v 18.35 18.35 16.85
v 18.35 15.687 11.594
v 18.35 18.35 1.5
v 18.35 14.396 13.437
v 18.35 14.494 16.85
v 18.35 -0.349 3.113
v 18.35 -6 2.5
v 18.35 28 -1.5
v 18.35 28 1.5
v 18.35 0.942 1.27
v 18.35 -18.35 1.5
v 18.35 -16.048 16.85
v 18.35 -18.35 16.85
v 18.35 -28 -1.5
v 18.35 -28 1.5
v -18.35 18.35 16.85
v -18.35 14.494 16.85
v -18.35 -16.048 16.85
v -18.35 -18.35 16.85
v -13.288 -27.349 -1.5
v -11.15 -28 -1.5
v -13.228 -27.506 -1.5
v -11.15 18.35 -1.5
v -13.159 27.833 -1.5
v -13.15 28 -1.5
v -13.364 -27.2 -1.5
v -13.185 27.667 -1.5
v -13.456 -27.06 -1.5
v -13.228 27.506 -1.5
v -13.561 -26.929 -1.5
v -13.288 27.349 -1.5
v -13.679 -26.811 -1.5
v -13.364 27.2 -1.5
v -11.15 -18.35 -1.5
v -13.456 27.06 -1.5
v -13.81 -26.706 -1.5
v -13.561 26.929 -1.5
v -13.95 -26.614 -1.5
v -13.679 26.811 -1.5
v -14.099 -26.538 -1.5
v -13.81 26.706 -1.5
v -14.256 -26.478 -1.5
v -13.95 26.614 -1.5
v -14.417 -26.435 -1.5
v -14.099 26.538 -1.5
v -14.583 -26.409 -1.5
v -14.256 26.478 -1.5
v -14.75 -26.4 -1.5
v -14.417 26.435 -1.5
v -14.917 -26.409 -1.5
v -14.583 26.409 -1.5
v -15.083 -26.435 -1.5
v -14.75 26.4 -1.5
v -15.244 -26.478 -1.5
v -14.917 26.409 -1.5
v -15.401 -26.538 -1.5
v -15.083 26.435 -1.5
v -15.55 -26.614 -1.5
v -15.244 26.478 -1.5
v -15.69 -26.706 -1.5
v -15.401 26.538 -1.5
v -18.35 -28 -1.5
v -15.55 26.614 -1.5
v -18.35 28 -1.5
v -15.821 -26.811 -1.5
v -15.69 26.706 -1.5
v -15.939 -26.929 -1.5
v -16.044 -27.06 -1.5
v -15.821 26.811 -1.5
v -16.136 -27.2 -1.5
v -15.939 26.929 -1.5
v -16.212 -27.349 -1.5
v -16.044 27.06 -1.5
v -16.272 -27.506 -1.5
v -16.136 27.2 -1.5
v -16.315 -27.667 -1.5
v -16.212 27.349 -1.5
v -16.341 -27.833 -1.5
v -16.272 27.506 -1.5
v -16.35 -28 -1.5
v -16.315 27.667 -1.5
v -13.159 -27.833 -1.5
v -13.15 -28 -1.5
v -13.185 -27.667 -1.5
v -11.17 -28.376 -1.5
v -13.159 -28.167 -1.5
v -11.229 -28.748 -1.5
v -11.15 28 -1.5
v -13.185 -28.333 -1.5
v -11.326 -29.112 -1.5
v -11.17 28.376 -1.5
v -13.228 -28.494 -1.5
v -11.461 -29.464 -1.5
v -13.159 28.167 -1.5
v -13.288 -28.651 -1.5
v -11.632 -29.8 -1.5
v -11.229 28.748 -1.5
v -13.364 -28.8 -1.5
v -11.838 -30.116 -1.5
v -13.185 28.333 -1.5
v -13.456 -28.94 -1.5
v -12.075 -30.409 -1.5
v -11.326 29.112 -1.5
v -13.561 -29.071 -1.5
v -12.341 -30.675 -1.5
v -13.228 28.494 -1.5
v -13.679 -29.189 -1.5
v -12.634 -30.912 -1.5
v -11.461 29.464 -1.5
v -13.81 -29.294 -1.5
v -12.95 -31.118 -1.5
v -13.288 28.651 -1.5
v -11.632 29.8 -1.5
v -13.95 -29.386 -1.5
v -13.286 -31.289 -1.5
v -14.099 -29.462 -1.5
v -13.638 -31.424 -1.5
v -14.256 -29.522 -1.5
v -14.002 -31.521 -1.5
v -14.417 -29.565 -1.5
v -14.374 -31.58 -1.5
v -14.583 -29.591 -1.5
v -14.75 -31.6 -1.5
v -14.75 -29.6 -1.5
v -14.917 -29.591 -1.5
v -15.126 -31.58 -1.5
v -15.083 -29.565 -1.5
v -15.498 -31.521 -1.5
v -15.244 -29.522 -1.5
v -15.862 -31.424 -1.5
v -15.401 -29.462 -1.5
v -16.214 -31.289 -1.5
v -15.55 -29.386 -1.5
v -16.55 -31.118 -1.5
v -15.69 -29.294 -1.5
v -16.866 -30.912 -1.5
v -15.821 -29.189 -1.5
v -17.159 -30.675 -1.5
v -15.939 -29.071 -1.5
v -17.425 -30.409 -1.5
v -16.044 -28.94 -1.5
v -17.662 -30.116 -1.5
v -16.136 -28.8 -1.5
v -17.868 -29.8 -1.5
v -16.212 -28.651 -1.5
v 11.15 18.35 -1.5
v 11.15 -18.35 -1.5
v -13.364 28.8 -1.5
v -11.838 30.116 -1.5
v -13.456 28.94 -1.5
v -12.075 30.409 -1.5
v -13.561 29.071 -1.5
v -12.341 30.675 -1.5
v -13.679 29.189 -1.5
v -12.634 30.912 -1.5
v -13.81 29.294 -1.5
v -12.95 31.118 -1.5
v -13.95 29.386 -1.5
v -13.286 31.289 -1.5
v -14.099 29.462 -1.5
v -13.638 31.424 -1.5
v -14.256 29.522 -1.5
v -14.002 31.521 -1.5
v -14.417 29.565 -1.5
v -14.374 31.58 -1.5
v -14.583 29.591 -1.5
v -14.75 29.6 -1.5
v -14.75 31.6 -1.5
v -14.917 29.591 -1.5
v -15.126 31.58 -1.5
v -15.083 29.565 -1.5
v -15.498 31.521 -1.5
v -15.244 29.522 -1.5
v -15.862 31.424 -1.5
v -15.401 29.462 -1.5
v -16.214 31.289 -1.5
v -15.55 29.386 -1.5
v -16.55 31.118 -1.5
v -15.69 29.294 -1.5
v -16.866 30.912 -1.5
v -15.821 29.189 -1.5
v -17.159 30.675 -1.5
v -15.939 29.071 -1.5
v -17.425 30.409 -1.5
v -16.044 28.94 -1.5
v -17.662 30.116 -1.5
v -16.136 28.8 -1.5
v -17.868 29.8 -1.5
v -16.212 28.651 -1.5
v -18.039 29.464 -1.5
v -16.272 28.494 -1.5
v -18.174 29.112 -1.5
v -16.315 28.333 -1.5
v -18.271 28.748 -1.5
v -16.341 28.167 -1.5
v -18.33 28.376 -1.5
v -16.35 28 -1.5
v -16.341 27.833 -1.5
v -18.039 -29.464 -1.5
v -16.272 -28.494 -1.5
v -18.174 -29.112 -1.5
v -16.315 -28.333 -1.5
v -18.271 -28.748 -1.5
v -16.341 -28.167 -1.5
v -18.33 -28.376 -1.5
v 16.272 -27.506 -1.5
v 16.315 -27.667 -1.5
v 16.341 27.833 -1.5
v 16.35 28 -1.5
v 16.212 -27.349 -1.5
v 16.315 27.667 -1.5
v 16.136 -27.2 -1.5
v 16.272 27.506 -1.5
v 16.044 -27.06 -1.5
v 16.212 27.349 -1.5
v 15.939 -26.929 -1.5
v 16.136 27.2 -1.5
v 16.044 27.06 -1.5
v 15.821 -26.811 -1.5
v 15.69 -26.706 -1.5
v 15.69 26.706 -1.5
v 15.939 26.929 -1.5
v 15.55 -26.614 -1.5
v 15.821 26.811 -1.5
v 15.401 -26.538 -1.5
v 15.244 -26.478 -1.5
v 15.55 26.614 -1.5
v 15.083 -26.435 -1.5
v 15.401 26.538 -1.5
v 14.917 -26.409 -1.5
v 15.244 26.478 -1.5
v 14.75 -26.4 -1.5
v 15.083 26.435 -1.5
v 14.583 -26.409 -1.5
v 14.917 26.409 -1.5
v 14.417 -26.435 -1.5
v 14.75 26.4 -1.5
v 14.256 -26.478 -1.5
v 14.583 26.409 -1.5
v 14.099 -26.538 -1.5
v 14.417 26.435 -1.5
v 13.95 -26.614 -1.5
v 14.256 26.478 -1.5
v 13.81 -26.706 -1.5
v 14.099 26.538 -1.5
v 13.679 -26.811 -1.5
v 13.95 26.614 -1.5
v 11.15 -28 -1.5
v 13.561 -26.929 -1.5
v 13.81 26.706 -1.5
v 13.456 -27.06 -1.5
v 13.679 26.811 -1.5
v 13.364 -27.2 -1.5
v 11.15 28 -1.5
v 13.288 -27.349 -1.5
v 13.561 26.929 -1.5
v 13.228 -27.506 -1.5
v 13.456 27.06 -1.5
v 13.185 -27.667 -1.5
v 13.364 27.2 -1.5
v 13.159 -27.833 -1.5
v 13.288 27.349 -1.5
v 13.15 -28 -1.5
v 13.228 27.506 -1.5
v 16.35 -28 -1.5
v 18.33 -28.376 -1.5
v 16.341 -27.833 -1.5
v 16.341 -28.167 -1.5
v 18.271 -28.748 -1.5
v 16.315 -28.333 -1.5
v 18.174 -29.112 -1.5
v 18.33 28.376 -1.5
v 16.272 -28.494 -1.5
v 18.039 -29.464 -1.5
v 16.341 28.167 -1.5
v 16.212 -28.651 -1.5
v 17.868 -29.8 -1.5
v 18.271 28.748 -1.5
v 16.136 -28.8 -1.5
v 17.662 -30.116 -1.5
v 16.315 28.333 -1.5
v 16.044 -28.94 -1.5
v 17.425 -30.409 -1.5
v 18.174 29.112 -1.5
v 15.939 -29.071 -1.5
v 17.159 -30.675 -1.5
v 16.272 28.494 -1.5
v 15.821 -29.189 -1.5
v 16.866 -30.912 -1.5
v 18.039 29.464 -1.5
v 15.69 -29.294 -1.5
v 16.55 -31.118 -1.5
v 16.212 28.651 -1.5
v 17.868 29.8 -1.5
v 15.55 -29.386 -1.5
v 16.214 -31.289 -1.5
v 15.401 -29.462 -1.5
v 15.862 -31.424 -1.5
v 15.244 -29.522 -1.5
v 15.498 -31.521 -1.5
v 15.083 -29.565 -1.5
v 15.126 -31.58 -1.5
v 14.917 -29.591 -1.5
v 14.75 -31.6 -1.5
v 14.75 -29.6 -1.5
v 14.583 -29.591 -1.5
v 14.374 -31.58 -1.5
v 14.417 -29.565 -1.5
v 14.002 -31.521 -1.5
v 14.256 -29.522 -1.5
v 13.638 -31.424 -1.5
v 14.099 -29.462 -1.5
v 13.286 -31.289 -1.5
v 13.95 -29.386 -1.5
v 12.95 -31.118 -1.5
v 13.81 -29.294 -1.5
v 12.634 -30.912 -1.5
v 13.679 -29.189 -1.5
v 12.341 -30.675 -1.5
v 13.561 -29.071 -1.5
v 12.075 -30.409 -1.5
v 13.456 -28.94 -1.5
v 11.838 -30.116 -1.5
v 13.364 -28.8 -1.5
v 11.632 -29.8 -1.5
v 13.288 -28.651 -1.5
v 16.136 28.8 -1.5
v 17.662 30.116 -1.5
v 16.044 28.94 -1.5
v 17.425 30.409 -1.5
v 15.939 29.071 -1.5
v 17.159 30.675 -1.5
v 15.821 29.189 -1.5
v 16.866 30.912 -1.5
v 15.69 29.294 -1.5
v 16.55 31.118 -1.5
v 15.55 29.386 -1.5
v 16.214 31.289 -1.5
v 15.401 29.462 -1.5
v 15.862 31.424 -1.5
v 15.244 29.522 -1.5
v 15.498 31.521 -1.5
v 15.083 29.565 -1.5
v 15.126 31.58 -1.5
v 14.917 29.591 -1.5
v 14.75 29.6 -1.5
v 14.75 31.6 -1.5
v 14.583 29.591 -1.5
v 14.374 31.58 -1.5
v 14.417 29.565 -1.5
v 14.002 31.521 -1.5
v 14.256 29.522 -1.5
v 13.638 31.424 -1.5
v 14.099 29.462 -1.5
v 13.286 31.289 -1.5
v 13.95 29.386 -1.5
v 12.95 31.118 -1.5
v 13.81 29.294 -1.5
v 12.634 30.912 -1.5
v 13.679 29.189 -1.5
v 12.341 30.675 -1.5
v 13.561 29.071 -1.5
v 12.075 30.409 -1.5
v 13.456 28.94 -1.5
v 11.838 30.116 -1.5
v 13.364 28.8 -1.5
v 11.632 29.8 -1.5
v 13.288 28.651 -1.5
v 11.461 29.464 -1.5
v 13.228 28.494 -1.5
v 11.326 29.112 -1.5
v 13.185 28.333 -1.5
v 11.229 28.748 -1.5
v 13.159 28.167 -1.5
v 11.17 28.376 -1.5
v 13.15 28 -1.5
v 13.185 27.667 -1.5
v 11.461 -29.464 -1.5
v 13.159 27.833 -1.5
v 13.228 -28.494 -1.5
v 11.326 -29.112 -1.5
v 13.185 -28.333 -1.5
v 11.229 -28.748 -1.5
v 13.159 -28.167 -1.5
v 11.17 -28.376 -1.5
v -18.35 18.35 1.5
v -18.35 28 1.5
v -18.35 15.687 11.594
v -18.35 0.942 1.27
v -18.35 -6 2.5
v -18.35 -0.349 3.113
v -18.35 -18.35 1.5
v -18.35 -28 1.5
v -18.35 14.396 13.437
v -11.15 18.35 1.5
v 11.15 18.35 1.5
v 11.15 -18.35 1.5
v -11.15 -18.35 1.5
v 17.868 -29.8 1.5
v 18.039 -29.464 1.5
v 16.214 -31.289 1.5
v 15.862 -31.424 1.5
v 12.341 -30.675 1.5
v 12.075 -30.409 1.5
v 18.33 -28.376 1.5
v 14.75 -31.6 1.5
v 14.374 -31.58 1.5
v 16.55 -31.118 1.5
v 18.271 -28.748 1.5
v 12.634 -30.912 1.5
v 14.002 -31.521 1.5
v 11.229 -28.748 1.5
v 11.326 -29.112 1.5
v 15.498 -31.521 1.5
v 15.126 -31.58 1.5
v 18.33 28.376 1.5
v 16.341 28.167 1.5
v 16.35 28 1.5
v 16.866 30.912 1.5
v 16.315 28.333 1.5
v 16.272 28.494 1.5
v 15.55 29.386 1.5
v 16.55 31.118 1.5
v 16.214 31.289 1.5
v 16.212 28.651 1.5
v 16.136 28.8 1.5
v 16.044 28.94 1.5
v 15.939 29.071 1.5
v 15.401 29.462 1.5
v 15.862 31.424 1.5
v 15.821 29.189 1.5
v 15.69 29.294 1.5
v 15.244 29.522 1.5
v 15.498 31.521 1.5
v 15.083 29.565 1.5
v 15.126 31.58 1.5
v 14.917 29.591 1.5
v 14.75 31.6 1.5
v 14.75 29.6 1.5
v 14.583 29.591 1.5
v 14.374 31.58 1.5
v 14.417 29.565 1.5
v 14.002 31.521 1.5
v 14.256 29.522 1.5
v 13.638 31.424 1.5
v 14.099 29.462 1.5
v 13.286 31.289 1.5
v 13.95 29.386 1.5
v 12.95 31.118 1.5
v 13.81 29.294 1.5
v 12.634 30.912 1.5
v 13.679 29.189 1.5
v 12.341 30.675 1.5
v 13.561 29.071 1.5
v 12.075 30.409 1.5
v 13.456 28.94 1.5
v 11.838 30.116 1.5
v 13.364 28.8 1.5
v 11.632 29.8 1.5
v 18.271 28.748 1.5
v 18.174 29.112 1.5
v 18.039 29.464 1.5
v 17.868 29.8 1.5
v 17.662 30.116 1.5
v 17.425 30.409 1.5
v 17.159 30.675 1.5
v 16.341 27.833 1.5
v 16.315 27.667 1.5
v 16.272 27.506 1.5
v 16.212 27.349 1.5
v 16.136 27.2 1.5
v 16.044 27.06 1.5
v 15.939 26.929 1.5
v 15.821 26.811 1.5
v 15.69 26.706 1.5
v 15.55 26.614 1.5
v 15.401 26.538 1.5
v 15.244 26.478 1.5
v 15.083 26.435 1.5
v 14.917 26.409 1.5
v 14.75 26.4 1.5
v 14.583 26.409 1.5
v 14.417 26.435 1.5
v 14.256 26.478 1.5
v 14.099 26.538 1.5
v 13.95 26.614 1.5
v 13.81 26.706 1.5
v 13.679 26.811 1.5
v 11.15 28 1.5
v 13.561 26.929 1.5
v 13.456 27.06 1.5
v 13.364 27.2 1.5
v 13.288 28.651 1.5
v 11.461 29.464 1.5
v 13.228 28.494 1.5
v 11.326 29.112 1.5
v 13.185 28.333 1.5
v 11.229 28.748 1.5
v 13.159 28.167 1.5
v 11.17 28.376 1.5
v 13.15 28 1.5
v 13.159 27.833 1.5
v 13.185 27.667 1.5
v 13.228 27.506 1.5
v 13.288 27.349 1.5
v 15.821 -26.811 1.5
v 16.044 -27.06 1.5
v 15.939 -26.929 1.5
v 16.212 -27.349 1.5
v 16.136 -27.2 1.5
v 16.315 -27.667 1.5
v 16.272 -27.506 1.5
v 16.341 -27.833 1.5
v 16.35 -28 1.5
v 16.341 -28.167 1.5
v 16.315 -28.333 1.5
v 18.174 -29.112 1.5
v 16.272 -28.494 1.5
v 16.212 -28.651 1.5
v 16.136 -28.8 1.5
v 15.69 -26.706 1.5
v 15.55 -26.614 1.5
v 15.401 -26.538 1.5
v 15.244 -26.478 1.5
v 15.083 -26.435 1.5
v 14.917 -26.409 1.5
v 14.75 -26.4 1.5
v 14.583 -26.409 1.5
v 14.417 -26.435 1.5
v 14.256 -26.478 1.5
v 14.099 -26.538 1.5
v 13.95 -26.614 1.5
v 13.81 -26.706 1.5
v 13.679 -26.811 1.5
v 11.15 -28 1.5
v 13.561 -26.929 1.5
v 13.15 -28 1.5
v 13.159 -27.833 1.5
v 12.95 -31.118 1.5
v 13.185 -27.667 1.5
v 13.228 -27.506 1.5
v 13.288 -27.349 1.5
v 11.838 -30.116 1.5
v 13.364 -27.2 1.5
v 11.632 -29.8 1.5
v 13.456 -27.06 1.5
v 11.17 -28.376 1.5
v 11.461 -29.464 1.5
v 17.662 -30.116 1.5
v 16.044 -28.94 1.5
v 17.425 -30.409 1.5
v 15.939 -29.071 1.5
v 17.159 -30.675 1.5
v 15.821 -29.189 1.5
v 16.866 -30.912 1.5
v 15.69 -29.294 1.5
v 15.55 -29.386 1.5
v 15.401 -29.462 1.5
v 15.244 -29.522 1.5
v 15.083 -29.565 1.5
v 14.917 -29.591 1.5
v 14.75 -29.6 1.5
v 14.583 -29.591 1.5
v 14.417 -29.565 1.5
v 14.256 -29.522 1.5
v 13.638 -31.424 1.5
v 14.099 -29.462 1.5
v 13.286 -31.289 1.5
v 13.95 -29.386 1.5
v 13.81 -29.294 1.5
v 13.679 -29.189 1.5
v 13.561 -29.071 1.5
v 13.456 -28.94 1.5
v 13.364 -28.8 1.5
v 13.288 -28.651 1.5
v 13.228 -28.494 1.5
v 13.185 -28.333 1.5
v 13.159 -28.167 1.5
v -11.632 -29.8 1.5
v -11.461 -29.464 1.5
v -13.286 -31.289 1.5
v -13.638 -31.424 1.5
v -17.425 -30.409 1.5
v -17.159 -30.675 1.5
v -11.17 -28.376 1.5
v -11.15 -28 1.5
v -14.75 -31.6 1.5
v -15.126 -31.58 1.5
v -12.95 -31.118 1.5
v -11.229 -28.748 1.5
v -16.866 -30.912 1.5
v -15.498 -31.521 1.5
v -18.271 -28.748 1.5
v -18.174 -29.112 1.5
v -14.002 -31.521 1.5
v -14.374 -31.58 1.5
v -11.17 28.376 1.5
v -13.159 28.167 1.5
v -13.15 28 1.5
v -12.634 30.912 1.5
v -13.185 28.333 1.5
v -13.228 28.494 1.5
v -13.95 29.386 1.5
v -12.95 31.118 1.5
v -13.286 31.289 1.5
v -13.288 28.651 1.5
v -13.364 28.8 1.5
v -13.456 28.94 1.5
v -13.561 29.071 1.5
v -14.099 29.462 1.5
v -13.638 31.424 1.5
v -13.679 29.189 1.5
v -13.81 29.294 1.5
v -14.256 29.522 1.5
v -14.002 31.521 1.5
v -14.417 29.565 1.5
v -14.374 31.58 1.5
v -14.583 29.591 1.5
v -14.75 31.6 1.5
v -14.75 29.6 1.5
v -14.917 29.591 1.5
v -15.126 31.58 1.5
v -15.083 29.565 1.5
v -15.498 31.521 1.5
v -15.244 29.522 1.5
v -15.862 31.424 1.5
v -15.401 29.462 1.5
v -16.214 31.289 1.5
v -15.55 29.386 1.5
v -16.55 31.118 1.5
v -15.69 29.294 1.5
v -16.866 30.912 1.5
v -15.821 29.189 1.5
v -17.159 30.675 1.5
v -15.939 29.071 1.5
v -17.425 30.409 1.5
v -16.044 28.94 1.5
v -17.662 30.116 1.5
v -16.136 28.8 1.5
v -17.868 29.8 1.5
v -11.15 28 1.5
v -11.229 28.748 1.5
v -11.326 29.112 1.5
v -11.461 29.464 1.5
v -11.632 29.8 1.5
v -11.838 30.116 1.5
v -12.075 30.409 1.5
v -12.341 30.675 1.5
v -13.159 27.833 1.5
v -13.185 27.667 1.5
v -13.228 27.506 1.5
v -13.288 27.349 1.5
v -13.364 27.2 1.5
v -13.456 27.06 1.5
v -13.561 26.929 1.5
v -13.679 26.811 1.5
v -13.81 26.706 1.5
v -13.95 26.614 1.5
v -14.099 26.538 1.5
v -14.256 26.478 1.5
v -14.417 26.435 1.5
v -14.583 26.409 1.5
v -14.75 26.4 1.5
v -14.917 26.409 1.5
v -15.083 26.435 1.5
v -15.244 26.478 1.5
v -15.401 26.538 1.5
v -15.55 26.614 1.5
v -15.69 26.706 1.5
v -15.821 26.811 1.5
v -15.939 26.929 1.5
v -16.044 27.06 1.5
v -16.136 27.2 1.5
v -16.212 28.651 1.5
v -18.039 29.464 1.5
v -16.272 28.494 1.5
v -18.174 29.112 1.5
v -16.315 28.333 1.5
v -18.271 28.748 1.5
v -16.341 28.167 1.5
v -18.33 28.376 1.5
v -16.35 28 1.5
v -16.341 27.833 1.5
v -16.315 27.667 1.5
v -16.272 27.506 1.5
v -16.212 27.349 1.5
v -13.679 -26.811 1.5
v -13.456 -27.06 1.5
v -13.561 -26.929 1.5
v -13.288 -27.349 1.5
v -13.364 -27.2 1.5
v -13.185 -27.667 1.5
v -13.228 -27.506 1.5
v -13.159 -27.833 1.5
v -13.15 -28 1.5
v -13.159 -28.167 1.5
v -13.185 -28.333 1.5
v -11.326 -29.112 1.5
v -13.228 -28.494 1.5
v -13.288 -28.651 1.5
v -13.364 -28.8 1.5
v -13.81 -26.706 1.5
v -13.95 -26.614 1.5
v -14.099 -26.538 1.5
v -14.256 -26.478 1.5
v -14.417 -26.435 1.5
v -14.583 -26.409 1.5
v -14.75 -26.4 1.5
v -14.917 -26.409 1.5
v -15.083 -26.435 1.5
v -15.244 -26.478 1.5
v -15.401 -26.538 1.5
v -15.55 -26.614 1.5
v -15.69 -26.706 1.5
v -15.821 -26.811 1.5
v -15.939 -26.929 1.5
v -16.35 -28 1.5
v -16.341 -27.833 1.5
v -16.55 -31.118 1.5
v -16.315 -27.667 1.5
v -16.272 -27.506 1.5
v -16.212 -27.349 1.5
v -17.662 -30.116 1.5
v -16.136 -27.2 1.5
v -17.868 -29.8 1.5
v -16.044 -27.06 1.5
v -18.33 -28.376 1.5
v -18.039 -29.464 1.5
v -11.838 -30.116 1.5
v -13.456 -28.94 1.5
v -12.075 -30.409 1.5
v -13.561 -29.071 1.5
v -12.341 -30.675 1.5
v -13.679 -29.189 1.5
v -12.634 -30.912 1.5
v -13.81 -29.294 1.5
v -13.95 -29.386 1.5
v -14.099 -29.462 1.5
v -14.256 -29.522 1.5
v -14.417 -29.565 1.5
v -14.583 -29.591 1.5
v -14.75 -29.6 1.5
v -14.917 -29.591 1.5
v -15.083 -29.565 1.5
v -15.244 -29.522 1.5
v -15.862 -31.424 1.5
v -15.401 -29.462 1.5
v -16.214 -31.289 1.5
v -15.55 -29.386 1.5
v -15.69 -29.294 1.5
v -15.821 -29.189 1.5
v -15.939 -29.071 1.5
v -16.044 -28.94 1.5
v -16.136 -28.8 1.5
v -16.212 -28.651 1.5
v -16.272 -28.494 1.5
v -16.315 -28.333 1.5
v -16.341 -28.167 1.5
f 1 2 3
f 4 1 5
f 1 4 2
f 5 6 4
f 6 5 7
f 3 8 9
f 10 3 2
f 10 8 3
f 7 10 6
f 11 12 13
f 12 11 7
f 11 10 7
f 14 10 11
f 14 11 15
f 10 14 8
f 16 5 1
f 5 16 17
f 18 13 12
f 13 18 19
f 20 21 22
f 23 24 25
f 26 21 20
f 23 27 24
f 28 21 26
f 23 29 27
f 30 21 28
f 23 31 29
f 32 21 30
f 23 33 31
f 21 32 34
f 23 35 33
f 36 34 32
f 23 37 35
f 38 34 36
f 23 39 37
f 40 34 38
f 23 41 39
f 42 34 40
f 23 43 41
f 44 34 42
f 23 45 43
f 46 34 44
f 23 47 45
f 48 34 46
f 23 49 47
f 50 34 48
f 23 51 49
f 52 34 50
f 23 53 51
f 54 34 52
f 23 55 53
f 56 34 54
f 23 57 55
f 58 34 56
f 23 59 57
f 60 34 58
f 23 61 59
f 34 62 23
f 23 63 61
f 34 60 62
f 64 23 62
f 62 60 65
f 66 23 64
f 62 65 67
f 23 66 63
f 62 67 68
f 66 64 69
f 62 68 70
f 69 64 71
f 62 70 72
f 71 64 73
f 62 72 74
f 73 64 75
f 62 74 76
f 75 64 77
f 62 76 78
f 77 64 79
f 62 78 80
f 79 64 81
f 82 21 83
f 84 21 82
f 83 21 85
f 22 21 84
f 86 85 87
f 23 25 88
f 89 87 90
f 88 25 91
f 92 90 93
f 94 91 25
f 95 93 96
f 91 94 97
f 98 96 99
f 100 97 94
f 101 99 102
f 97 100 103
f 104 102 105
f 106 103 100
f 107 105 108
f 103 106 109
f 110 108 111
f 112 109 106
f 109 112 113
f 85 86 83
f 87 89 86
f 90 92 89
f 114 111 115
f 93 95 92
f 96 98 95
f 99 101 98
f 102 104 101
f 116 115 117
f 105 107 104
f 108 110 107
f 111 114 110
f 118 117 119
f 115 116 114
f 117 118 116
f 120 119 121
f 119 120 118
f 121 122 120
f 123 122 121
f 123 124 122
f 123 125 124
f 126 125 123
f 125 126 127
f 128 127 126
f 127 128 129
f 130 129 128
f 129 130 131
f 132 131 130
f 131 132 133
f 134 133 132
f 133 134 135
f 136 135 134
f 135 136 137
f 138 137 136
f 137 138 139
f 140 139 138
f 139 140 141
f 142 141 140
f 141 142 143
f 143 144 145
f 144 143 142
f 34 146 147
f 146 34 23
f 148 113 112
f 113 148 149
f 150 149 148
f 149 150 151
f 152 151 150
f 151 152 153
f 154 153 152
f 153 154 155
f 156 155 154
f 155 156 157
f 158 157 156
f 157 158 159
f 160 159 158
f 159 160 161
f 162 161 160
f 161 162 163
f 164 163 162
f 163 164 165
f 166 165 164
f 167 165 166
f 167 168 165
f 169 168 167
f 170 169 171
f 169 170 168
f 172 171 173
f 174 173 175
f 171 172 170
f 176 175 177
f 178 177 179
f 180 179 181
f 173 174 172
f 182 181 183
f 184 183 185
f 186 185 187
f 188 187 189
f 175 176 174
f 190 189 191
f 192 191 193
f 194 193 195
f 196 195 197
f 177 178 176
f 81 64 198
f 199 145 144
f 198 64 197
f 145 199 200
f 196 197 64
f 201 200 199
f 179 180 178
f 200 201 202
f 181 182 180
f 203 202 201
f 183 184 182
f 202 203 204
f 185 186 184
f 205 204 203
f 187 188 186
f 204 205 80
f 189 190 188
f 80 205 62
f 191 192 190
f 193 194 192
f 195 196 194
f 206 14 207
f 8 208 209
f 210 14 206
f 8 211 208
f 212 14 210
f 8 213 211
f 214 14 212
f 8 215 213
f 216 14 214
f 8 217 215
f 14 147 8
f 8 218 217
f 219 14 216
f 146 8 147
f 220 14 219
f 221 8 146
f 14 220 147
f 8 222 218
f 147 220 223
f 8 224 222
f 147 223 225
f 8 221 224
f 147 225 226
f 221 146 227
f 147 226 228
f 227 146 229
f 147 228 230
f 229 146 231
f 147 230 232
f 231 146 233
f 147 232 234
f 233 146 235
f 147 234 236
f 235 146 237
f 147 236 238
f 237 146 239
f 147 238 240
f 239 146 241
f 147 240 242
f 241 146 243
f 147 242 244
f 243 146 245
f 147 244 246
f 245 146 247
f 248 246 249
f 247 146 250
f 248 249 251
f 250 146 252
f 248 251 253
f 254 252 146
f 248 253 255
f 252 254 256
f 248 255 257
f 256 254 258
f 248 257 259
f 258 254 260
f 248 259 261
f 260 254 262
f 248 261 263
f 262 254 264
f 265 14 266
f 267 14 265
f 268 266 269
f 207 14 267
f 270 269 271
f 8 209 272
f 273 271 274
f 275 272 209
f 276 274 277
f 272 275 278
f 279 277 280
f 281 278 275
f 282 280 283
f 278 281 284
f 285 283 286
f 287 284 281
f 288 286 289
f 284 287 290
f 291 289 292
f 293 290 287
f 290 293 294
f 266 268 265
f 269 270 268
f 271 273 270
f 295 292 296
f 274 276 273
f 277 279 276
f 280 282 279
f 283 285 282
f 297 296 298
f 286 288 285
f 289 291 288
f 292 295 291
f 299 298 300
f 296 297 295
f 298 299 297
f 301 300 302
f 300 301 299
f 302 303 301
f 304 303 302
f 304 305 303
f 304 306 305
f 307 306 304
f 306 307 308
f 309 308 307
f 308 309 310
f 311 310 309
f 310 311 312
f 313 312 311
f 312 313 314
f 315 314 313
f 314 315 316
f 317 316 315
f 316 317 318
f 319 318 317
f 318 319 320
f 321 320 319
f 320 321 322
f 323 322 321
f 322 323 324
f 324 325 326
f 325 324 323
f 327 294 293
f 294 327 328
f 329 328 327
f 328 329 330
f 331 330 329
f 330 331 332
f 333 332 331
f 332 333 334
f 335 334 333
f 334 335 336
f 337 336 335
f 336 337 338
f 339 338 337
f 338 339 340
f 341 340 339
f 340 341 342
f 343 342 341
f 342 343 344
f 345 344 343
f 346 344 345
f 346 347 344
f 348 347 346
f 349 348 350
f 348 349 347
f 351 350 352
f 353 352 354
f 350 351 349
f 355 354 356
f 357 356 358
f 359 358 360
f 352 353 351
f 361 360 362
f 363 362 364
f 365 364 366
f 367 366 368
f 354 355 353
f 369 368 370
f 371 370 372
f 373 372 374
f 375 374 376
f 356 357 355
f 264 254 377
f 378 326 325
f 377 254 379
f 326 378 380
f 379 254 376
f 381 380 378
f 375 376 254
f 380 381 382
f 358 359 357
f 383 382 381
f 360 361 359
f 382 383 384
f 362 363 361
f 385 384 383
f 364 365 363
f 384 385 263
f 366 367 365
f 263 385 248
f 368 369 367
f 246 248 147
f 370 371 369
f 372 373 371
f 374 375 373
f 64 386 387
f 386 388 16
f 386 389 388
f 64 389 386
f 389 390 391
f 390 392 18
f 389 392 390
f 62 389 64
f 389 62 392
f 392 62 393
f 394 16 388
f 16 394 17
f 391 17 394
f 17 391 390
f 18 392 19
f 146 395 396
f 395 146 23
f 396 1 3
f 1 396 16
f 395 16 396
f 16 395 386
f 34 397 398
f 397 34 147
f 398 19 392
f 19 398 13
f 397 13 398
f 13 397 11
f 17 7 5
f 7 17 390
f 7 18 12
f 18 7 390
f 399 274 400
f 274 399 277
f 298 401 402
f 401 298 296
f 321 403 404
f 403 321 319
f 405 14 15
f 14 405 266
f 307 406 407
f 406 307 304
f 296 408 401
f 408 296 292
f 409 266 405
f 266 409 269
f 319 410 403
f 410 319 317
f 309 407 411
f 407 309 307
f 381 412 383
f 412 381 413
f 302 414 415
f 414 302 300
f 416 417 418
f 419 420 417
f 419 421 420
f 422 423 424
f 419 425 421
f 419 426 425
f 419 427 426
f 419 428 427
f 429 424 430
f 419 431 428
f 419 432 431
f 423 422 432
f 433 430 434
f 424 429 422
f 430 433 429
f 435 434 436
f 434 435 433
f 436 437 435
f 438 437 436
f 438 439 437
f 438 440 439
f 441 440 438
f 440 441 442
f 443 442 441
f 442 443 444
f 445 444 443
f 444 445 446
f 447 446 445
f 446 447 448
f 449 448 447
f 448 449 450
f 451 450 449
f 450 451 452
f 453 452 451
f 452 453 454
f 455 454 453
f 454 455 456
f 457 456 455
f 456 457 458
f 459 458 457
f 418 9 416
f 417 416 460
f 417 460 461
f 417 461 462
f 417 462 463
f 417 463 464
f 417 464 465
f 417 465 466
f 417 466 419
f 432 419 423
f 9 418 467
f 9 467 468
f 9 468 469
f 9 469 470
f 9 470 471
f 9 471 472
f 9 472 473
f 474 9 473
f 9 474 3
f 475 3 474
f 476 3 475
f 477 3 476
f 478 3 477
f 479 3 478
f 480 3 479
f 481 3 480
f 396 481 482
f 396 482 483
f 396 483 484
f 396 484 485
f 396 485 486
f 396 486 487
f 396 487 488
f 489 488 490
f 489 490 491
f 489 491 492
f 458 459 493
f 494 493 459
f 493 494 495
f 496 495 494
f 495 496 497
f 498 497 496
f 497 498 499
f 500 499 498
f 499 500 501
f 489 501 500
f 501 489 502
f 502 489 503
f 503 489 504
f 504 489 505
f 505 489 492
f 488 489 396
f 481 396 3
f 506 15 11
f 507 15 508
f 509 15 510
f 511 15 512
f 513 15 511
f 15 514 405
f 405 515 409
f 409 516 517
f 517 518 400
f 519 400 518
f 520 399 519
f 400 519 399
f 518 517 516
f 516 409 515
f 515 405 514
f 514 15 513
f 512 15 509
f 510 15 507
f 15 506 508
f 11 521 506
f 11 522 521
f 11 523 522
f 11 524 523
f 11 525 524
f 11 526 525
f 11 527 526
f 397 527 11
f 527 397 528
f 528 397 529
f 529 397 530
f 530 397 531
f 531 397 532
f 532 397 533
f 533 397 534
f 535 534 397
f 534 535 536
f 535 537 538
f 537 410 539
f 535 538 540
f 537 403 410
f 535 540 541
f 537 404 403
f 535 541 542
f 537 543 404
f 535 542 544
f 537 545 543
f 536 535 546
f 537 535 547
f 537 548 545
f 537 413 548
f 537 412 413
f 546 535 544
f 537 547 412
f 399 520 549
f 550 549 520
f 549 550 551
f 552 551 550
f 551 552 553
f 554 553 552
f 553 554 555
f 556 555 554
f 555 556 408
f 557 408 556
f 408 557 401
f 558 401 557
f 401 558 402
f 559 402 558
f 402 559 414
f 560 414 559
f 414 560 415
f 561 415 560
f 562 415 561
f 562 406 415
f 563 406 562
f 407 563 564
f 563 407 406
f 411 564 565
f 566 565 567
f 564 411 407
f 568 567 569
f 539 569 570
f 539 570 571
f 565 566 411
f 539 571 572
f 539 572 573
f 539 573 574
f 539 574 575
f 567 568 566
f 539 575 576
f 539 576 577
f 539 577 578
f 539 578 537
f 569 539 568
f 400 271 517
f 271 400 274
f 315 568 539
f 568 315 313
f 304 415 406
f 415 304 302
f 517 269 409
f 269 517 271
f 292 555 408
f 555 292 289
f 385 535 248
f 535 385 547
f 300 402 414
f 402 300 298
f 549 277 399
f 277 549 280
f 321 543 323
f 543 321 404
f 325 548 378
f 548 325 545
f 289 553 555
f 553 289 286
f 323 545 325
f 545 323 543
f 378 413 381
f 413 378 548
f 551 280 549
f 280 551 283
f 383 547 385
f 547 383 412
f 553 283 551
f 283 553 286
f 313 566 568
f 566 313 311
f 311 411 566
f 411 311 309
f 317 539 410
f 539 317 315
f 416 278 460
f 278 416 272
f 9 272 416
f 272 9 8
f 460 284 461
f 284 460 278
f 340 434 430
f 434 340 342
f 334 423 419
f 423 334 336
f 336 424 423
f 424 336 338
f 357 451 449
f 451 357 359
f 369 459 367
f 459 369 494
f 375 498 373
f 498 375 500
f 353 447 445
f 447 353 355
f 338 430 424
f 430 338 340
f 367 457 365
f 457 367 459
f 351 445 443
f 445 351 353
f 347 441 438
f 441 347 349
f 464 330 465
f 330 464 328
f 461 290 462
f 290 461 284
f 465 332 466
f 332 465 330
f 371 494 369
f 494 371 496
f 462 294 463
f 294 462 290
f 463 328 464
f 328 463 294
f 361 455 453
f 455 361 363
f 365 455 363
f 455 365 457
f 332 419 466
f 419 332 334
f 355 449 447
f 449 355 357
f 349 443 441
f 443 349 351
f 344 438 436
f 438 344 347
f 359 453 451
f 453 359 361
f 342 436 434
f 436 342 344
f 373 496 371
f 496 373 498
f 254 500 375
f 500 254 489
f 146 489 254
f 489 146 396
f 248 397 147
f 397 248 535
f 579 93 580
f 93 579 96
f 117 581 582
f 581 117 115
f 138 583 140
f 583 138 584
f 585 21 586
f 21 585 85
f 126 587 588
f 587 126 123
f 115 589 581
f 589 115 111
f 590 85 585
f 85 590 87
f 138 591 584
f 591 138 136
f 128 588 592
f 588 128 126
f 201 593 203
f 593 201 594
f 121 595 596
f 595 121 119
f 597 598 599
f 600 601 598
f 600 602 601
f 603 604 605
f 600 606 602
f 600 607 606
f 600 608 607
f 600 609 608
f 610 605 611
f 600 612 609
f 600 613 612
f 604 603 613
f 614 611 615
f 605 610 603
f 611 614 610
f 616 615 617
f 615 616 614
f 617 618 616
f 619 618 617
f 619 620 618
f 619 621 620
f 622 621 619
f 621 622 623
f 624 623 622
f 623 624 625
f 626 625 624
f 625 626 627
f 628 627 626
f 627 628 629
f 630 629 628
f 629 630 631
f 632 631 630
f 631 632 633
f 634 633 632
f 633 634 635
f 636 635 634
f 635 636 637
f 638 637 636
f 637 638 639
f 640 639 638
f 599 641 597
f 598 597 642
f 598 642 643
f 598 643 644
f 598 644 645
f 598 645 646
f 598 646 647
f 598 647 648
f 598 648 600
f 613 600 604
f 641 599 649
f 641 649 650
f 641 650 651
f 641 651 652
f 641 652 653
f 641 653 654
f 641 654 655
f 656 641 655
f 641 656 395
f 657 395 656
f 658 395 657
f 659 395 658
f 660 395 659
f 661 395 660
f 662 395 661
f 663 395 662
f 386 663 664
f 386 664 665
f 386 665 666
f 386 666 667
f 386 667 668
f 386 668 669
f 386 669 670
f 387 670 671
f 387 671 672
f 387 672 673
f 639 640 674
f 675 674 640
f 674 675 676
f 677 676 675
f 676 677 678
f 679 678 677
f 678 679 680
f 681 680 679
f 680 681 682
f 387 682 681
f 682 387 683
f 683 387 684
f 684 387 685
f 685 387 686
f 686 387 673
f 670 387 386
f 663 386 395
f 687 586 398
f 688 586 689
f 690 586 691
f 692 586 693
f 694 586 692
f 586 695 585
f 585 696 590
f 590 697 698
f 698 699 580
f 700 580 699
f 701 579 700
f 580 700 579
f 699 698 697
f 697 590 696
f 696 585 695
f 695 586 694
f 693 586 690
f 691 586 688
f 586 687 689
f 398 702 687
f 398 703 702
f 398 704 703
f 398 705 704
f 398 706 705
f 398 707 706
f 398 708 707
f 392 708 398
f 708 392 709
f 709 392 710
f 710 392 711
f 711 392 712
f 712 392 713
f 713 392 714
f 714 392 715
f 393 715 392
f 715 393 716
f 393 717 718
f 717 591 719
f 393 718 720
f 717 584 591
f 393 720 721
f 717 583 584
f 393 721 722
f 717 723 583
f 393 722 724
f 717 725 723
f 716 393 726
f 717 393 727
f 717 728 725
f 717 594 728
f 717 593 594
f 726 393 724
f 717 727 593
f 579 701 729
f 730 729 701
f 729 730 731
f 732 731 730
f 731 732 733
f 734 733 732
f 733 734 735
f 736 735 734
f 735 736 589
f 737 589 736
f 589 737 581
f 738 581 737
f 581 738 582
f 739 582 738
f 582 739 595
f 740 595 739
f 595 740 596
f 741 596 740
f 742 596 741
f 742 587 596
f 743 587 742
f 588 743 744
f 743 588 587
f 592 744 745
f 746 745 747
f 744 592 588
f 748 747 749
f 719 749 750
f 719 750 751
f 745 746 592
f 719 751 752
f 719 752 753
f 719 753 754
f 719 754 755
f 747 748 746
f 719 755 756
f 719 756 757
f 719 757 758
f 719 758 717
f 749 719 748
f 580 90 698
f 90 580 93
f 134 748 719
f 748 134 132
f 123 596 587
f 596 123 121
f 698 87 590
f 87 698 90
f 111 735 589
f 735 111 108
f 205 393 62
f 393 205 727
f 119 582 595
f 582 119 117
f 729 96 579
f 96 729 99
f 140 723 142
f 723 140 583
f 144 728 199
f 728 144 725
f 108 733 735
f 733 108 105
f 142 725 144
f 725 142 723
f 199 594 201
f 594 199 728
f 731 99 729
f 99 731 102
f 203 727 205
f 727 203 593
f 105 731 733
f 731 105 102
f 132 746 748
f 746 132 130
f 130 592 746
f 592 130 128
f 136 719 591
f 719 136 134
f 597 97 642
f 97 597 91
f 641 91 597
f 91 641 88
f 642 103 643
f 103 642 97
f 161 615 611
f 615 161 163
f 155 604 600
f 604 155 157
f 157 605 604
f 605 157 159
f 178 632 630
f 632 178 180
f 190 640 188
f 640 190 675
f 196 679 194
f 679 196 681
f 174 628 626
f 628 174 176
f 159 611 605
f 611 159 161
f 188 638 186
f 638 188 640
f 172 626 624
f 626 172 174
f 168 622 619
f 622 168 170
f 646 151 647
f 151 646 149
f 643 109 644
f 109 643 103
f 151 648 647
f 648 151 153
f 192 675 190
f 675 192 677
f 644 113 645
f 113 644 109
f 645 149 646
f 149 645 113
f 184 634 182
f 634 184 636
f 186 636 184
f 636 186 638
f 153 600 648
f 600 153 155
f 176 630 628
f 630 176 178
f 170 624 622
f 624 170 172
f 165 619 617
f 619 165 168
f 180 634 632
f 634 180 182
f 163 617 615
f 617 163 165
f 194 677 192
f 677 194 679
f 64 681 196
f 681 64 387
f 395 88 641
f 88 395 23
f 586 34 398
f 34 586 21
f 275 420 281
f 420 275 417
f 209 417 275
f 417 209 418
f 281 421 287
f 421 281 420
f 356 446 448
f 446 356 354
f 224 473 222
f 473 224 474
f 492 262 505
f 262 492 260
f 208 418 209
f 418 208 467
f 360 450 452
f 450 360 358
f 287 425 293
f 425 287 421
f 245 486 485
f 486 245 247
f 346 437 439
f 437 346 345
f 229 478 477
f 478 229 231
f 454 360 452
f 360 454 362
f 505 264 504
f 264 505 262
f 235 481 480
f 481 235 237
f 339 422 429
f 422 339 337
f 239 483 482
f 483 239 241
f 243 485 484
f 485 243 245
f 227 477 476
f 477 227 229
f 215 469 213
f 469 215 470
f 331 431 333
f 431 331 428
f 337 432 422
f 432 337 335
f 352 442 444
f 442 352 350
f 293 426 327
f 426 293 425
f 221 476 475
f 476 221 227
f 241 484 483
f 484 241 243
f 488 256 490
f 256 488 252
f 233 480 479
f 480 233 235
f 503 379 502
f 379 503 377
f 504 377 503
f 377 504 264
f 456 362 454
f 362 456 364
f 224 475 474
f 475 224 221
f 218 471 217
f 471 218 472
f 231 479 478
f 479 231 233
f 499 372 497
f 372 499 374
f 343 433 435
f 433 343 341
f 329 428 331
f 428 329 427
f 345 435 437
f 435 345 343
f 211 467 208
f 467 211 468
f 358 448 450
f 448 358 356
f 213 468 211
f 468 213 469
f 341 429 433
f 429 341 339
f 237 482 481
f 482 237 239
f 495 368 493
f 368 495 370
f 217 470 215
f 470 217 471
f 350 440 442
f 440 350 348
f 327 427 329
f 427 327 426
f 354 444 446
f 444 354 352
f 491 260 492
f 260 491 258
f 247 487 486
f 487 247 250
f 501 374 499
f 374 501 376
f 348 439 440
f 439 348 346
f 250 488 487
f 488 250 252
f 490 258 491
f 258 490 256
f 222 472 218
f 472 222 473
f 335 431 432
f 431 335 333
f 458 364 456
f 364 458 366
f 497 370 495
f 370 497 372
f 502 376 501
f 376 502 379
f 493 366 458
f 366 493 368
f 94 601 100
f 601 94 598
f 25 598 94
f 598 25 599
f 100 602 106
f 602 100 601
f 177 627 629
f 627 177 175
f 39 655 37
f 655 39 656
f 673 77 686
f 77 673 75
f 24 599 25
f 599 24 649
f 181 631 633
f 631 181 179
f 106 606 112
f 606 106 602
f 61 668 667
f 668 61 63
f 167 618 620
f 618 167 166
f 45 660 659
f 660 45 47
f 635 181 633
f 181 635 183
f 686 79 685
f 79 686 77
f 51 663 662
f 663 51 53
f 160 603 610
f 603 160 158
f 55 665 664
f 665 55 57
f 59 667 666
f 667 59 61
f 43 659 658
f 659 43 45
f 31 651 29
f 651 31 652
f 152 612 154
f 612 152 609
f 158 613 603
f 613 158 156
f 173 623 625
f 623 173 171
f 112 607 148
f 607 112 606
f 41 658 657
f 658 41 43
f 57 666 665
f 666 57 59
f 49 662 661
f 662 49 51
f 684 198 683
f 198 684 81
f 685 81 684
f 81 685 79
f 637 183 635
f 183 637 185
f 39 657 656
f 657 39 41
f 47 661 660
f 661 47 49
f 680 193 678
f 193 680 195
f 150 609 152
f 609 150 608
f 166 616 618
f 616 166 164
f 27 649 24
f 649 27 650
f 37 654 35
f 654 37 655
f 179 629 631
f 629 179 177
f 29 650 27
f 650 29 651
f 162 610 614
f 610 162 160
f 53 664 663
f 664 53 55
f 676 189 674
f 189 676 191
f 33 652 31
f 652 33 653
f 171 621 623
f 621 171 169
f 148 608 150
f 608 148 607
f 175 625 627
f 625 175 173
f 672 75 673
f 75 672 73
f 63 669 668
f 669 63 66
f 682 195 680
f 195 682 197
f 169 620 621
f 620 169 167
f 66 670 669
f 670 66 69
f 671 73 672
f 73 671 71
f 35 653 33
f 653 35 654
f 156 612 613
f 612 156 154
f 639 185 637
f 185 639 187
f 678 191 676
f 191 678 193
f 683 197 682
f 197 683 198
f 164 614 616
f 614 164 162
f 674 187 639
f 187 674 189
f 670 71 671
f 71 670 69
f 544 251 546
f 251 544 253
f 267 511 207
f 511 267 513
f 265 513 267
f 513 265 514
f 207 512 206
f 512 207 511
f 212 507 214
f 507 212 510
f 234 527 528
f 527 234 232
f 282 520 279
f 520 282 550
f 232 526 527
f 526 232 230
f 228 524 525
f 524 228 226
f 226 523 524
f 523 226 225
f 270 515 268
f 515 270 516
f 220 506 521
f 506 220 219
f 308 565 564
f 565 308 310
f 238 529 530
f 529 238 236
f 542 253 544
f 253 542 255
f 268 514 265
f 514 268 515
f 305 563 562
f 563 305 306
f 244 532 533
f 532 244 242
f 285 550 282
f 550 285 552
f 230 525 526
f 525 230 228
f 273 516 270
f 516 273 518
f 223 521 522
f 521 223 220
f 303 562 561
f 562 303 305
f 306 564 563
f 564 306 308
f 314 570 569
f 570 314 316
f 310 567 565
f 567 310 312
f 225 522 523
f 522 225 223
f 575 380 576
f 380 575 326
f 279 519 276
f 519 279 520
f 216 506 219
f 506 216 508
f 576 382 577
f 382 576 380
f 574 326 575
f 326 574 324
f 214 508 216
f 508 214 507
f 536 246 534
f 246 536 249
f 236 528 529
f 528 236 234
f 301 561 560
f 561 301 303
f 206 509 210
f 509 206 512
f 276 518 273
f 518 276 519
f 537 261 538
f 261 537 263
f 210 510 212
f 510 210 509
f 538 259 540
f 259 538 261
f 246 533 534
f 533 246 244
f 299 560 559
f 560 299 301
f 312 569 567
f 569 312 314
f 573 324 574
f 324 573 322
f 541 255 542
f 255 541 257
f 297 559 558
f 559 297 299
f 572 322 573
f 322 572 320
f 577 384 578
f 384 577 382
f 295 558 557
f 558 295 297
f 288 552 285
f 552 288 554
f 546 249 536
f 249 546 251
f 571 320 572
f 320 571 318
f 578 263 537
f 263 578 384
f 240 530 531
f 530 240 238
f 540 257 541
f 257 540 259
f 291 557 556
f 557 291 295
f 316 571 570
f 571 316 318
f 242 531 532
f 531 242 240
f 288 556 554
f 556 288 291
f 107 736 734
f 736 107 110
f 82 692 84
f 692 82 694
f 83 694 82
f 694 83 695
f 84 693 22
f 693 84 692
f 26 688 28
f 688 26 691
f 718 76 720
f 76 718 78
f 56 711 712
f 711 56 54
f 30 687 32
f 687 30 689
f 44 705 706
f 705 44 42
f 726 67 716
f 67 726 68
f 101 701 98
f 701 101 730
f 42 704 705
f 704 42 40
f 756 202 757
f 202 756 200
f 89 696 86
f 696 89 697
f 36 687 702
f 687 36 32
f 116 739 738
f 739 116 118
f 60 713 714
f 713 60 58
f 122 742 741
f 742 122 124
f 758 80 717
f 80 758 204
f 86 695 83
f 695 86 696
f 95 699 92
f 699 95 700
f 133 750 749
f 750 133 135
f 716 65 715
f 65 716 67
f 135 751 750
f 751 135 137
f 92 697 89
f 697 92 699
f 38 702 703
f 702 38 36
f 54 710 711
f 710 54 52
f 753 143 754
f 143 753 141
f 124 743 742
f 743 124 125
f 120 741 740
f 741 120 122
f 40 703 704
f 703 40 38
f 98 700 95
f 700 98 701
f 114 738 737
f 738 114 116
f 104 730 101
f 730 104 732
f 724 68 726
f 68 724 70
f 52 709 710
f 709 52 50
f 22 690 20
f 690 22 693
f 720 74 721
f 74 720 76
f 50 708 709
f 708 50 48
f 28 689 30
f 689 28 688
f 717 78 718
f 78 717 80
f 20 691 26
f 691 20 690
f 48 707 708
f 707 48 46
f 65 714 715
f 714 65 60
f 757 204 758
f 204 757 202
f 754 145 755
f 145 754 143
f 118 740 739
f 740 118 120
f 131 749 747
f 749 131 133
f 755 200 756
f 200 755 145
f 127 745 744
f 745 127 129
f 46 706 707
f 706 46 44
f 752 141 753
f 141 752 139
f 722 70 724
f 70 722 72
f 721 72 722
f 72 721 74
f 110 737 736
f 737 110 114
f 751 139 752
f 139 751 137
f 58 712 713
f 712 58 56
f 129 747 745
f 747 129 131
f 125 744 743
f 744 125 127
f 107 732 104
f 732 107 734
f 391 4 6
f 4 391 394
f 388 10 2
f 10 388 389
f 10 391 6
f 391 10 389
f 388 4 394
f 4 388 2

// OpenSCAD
use <MCAD/boxes.scad>;

screw_x_cc = 29.5;
screw_y_cc = 56;
hole_size = 3.2;
screw_margin = 4;

front_inset = 10;
back_inset = 10;
plate_h = 3;

camera_angle = 35;

velcro_width = 18;
velcro_thickness = 2.25;

base_size_x = screw_x_cc+hole_size+screw_margin;
base_size_y = (screw_y_cc+hole_size+screw_margin);

difference() {
    $fn = 60;
    union() {
        mount_box();
        translate([screw_x_cc/2,0,0]) roundedBox([hole_size+screw_margin, base_size_y, plate_h], (hole_size+screw_margin)/2, true);
        translate([-screw_x_cc/2,0,0]) roundedBox([hole_size+screw_margin, base_size_y, plate_h], (hole_size+screw_margin)/2, true);
    }
    
    // screw holes
    translate([screw_x_cc/2, screw_y_cc/2, 0]) cylinder(h=plate_h+1, d=hole_size, center=true);
    translate([-screw_x_cc/2, screw_y_cc/2, 0]) cylinder(h=plate_h+1, d=hole_size, center=true);
    translate([screw_x_cc/2, -screw_y_cc/2, 0]) cylinder(h=plate_h+1, d=hole_size, center=true);
    translate([-screw_x_cc/2, -screw_y_cc/2, 0]) cylinder(h=plate_h+1, d=hole_size, center=true);

    // velcro hole
    translate([-(base_size_x+1)/2,0,0])
        rotate([camera_angle,0,0])
            translate([0,1.5,0.5])
                cube([base_size_x+1, velcro_width, velcro_thickness], center=false);
}

module mount_box() {
    difference() {
        translate([0,0,(base_size_x/4)-plate_h/2]) 
            cube([base_size_x, base_size_x,base_size_x/2], true);
        
        translate([-(base_size_x+1)/2,-6,(plate_h/2)+1])
           rotate([camera_angle, 0,0])
                cube([base_size_x+1, base_size_x,base_size_x], false);
        
    }
}
